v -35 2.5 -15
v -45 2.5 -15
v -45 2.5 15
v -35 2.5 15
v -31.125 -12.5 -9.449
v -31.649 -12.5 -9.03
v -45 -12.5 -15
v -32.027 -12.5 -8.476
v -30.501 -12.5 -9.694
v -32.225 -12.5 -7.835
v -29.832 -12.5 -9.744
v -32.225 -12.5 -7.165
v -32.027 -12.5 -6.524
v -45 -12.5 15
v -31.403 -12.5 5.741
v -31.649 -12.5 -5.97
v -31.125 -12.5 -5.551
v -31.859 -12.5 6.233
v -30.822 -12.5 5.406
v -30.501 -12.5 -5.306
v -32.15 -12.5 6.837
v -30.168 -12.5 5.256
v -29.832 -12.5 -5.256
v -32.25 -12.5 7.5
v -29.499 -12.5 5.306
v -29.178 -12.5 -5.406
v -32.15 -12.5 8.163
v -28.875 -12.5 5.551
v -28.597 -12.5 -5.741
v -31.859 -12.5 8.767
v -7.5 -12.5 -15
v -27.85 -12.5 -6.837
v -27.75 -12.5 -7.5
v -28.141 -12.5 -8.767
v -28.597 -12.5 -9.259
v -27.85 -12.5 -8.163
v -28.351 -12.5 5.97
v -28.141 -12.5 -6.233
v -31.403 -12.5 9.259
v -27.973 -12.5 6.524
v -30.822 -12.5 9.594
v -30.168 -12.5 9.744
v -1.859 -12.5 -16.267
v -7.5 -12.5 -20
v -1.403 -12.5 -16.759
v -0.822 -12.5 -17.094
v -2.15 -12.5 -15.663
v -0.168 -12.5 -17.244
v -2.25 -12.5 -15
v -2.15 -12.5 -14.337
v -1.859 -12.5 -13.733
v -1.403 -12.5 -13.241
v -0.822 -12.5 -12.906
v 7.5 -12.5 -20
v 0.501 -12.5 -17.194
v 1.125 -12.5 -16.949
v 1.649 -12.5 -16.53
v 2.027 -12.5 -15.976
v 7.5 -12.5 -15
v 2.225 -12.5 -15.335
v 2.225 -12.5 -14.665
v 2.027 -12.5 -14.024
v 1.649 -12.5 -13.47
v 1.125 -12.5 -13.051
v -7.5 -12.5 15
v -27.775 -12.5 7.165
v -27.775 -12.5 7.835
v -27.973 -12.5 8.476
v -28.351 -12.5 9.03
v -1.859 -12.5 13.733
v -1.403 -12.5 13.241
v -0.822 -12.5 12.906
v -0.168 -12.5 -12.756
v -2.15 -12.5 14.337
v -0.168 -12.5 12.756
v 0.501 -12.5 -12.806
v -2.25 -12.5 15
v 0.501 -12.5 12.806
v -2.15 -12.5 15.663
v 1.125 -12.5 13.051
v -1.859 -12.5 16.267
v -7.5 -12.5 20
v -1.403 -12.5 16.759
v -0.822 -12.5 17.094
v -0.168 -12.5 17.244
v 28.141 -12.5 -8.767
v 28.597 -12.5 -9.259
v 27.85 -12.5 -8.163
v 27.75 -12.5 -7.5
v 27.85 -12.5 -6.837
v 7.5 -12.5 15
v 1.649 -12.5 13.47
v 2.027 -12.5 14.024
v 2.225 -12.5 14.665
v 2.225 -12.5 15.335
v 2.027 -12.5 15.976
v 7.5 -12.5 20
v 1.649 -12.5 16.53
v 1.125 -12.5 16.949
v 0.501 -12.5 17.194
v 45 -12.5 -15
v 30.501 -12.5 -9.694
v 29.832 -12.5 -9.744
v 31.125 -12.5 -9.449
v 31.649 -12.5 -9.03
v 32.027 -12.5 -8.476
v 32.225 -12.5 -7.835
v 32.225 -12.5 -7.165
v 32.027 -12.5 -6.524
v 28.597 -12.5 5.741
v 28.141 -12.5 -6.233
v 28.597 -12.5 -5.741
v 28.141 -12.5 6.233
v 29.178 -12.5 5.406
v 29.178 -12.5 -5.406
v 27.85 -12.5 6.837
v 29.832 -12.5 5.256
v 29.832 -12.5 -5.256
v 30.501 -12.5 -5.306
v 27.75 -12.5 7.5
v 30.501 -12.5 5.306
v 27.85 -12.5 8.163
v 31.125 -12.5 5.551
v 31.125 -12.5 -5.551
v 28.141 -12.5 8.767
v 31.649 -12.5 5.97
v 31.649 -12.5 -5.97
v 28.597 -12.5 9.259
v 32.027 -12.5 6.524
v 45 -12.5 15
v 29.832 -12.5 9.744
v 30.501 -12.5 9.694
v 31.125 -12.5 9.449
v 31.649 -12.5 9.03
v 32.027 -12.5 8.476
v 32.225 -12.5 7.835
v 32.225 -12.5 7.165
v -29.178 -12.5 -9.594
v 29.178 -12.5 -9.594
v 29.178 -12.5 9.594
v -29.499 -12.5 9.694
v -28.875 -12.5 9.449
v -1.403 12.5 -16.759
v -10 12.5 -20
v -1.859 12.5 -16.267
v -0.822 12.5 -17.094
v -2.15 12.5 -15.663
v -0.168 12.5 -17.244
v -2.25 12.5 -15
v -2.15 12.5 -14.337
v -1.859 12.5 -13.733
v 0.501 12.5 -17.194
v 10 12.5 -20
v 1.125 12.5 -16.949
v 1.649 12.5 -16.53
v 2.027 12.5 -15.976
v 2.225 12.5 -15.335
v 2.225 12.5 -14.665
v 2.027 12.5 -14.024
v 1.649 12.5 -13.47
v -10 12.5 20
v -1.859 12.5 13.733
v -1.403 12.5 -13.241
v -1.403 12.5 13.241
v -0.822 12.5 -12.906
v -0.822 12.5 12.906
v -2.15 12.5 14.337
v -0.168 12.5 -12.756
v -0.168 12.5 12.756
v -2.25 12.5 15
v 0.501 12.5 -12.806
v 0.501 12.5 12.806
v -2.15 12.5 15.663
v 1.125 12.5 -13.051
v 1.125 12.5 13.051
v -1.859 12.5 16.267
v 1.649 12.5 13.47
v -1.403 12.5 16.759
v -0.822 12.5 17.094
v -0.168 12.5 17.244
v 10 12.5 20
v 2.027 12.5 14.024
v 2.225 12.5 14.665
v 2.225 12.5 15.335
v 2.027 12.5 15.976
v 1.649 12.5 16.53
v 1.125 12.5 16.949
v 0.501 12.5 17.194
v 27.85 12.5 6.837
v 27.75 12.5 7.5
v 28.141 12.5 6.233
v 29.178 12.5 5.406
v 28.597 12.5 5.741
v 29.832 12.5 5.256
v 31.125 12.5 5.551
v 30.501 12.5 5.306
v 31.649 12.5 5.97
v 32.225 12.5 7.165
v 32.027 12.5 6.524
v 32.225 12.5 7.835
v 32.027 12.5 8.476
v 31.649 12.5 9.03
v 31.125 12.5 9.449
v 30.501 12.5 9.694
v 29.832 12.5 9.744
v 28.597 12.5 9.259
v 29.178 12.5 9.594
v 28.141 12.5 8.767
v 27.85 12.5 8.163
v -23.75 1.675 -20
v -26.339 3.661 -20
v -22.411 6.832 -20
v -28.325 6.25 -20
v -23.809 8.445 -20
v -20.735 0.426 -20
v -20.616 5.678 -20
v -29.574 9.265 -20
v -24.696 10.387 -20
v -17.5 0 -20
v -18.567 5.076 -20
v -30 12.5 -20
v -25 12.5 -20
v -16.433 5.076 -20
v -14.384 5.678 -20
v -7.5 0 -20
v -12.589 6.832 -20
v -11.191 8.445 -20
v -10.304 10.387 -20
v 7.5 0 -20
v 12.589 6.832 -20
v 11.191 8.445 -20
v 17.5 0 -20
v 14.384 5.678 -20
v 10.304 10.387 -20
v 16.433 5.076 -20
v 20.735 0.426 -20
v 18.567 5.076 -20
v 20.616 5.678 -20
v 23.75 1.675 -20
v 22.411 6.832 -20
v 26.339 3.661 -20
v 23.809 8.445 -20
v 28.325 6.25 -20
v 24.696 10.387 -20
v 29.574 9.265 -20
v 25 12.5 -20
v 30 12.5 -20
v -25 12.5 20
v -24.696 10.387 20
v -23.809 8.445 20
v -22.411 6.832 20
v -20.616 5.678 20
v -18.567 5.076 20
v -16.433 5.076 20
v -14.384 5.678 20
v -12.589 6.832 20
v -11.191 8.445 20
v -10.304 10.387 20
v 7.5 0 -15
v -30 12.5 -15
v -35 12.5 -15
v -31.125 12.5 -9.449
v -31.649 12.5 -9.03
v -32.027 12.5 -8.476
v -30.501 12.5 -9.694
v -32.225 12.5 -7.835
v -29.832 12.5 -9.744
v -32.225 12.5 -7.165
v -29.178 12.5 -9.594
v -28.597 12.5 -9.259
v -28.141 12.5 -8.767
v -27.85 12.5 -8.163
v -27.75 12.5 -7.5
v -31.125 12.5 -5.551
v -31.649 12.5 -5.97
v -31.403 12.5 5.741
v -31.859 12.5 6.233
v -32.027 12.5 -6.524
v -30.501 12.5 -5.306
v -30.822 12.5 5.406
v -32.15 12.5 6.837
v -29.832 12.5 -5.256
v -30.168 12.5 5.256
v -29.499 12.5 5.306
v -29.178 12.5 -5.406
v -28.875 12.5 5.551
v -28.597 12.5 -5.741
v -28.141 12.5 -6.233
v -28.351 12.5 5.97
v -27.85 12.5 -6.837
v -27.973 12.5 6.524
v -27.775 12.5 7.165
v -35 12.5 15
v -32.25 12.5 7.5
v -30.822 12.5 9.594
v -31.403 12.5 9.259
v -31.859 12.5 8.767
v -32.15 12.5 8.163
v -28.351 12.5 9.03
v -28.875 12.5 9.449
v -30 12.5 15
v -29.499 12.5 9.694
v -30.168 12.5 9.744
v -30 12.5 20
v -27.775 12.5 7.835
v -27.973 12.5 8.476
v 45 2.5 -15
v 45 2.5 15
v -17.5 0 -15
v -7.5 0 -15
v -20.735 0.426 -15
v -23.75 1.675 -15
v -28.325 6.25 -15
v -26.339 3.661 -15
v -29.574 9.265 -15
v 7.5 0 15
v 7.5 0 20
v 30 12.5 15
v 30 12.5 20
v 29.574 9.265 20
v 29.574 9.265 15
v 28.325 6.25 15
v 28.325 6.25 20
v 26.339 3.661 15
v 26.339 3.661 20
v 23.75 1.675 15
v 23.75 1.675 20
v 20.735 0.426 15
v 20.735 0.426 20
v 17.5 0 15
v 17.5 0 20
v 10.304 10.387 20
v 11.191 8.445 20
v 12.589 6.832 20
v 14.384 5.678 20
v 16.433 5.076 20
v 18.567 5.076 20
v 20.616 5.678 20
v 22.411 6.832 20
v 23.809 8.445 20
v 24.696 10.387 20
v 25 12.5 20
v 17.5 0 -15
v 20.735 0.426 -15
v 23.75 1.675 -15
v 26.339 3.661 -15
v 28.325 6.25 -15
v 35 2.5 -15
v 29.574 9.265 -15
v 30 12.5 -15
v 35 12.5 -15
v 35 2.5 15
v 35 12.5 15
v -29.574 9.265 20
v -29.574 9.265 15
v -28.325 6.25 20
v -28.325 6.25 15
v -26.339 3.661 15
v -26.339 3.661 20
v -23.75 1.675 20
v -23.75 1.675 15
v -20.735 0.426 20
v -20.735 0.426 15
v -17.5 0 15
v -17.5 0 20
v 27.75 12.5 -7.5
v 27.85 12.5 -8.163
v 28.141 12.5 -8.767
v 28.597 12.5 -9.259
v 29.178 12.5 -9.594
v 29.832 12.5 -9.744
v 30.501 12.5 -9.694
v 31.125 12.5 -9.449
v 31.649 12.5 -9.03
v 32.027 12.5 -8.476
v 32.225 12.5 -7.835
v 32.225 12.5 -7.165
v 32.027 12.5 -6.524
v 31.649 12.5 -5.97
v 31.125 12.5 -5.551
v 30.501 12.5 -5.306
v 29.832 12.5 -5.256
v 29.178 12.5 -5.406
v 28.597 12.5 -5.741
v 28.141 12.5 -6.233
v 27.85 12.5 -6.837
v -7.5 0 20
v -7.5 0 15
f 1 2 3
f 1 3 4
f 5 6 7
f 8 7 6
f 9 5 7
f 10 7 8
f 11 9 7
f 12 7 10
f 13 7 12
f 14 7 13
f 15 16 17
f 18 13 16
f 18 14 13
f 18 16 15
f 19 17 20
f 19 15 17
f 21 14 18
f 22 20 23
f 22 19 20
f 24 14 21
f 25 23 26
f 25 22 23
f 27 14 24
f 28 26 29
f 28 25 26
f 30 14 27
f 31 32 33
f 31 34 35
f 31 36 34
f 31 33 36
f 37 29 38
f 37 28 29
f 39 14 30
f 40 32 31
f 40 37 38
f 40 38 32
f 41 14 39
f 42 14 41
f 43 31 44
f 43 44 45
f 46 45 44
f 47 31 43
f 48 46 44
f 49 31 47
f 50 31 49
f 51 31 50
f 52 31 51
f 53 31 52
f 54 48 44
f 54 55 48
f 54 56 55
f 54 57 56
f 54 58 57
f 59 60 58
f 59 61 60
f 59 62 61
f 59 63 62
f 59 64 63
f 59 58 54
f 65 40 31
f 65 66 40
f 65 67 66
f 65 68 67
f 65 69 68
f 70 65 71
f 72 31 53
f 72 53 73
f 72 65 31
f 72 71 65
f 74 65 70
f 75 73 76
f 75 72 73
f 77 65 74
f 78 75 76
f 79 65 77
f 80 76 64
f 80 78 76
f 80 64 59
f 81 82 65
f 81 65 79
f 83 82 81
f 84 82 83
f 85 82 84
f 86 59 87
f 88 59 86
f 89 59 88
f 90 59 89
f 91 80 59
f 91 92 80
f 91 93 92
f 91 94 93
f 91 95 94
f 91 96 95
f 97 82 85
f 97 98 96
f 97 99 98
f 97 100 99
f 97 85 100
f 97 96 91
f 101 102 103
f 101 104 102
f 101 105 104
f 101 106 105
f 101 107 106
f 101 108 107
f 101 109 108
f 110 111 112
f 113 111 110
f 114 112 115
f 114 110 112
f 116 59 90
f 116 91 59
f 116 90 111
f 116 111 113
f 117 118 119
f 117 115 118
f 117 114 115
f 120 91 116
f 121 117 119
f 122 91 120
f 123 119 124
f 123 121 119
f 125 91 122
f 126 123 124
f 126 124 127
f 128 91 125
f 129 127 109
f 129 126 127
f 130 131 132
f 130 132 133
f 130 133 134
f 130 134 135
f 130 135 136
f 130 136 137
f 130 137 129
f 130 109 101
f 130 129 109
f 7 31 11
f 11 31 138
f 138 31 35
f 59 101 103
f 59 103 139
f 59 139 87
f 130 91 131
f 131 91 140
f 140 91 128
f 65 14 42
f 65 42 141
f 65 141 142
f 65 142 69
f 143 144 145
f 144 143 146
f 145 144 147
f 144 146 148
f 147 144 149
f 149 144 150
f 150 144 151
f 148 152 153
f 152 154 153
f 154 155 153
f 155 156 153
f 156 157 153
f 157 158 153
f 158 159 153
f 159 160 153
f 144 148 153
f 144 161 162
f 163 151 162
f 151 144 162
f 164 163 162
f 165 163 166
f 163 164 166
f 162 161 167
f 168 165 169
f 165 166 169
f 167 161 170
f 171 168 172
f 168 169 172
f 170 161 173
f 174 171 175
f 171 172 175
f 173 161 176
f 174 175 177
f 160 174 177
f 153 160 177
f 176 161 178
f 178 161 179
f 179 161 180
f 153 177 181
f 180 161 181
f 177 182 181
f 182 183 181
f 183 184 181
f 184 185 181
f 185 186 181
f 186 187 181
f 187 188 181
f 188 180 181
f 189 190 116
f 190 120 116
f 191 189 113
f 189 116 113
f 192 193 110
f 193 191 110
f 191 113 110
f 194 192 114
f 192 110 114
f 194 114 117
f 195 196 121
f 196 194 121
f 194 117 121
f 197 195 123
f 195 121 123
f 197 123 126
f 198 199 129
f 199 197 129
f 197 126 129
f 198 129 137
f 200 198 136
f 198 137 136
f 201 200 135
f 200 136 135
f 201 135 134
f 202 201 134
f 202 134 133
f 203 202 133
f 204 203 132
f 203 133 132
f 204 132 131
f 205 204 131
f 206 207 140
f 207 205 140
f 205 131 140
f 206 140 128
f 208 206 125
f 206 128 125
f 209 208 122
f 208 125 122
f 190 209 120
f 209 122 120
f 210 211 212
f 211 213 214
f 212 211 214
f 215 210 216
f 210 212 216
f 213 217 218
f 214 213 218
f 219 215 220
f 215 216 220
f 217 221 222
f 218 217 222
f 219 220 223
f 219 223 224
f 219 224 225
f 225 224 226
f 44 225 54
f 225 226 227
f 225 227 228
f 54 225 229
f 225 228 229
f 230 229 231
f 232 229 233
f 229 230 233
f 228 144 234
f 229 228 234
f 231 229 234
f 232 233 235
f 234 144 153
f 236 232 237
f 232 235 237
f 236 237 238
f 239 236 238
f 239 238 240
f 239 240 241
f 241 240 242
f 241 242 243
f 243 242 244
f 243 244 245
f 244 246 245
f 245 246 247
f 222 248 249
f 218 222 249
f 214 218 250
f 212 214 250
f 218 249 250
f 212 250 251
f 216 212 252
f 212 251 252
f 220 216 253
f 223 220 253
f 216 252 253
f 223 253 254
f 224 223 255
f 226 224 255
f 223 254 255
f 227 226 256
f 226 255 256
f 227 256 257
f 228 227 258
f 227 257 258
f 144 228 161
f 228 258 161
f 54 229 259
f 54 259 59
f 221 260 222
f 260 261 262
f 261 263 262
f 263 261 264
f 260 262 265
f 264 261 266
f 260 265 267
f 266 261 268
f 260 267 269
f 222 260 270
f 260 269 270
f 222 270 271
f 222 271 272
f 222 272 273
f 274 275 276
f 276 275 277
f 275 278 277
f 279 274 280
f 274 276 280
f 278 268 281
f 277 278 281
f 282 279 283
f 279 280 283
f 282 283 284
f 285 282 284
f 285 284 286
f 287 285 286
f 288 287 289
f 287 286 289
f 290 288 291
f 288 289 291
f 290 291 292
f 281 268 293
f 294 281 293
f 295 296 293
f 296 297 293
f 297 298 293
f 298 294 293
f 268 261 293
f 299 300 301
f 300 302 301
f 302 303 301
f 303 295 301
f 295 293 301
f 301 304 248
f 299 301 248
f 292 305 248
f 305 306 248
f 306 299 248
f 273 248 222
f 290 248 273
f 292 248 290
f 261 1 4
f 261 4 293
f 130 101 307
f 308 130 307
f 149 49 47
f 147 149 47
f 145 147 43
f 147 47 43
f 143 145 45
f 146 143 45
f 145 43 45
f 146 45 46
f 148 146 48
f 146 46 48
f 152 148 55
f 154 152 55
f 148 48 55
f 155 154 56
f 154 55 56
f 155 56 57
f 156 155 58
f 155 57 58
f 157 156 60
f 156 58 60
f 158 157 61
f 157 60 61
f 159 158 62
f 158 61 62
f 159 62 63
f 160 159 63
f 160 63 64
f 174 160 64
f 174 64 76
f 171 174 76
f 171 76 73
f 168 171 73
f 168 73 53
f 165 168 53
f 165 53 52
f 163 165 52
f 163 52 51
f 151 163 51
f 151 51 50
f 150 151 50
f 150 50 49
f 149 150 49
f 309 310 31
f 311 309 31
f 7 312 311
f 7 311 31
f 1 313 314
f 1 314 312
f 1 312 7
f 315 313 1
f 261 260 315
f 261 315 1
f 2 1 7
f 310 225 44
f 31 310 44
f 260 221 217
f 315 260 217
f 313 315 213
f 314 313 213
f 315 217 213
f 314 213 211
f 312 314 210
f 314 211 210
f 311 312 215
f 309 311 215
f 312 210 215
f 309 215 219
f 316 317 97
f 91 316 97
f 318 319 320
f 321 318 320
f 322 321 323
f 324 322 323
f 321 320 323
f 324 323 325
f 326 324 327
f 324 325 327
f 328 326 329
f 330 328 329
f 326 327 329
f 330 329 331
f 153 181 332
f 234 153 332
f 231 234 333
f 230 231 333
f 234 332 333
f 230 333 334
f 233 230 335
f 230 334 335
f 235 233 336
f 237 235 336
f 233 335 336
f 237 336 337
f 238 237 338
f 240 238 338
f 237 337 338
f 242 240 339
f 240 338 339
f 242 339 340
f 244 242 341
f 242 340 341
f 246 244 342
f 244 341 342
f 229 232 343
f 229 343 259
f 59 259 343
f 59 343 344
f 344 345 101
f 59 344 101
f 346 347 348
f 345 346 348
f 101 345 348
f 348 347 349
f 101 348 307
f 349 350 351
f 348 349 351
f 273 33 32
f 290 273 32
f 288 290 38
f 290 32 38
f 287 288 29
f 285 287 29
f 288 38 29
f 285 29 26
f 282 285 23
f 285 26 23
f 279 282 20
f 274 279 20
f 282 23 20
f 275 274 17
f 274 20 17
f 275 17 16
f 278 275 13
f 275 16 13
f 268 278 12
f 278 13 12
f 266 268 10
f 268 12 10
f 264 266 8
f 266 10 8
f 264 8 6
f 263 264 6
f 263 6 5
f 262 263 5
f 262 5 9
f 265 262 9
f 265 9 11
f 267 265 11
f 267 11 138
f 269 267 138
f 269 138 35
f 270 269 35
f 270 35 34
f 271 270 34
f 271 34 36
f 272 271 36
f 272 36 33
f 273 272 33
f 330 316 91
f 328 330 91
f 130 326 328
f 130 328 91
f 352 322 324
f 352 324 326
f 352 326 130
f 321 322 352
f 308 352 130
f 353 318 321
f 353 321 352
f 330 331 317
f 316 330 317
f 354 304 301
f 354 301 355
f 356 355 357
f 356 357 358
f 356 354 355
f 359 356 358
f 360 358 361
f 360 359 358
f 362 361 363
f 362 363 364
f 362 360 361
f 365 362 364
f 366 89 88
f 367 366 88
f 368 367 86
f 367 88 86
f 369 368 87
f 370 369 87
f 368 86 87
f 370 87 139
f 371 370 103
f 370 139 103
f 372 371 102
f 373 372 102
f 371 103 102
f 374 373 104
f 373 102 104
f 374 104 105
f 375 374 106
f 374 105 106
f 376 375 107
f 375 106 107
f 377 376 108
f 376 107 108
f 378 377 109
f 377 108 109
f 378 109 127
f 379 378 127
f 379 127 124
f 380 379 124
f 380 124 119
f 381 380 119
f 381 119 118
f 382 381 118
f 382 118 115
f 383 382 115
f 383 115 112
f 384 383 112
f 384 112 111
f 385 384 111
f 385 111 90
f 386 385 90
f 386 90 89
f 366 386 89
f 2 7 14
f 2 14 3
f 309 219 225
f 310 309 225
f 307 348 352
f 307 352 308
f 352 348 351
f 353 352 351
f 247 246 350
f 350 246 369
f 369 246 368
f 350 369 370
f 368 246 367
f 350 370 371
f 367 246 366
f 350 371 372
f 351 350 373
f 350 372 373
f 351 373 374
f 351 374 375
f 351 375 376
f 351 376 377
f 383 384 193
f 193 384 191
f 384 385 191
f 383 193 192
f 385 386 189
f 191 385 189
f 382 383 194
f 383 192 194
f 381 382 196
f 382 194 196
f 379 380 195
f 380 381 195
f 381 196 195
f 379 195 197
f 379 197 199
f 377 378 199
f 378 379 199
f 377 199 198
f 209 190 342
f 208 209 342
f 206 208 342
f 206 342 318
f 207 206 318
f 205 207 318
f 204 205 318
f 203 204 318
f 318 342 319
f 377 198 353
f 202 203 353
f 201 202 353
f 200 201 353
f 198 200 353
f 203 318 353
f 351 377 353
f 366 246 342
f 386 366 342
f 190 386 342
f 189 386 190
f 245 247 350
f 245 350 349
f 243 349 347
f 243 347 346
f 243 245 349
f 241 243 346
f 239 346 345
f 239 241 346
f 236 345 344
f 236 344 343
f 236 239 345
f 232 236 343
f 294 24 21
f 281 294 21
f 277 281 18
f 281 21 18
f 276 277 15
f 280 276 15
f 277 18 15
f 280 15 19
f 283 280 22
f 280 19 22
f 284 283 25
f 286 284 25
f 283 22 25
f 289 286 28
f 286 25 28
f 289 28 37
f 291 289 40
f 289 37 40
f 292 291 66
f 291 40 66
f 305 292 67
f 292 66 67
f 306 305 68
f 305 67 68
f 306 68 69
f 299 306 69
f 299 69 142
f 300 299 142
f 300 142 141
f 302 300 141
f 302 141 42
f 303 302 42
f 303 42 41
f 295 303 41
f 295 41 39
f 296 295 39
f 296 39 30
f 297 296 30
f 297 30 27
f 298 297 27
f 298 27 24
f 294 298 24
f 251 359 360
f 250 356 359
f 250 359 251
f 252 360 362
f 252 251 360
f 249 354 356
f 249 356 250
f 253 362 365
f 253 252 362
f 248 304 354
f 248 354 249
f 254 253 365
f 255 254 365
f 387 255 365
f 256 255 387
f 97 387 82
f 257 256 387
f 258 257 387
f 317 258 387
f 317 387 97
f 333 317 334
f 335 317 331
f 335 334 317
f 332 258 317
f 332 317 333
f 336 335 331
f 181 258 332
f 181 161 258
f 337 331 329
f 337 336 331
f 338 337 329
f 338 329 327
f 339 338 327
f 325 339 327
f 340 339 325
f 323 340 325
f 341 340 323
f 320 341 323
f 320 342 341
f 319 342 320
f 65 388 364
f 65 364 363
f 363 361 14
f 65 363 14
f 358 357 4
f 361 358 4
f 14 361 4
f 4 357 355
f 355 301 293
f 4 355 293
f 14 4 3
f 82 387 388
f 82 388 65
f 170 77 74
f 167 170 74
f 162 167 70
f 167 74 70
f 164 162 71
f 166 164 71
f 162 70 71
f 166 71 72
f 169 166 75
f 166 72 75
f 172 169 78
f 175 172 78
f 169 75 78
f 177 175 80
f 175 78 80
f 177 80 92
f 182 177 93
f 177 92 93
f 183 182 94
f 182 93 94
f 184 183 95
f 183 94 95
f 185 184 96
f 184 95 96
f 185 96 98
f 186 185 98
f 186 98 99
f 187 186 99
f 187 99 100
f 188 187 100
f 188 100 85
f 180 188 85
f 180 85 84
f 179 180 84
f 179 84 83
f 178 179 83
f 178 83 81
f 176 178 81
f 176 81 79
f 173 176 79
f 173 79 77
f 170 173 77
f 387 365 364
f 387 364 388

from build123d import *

# Parameters (mm, degrees)
SKETCH1_W               = 90
SKETCH1_H               = 25
BOSS_EXTRUDE1_DEPTH     = 20
CUT_EXTRUDE1_DEPTH      = 62.491869381
CUT_EXTRUDE1_DEPTH_BACK = 62.491869381
SKETCH2_W               = 10
SKETCH2_H               = 10
CUT_EXTRUDE2_DEPTH      = 5
CUT_EXTRUDE3_DEPTH      = 62.491869381
HOLE1_D                 = 4.5
LPATTERN1_COUNT         = 2
LPATTERN1_PITCH         = 15
LPATTERN1_COL_COUNT     = 2
LPATTERN1_COL_PITCH     = 60
MIRROR2_COPY_1_D        = 4.5
MIRROR2_COPY_2_D        = 4.5
MIRROR2_COPY_3_D        = 4.5
HOLE2_D                 = 4.5


with BuildPart() as part:
    # Sketch1 → Boss-Extrude1 (new, symmetric)
    with BuildSketch(Plane.XY):
        Rectangle(SKETCH1_W, SKETCH1_H)
    extrude(amount=BOSS_EXTRUDE1_DEPTH, both=True)

    # Sketch2 → Cut-Extrude1 (cut, two sides: drawn at the far end of the back side and taken through both)
    with BuildSketch(Plane.XY.offset(20).offset(-CUT_EXTRUDE1_DEPTH_BACK)):
        with Locations((-40, 7.5)):
            Rectangle(SKETCH2_W, SKETCH2_H)
        with Locations((40, 7.5)):
            Rectangle(SKETCH2_W, SKETCH2_H)
    extrude(amount=CUT_EXTRUDE1_DEPTH + CUT_EXTRUDE1_DEPTH_BACK, mode=Mode.SUBTRACT)

    # Sketch3 → Cut-Extrude2 (cut)
    with BuildSketch(Plane.XY.offset(20)):
        with BuildLine():
            Line((45, -12.5), (45, 2.5))
            Line((45, 2.5), (35, 2.5))
            Line((35, 2.5), (35, 12.5))
            Line((35, 12.5), (30, 12.5))
            ThreePointArc((30, 12.5), (26.338834765, 3.661165235), (17.5, 0))
            Line((17.5, 0), (7.5, 0))
            Line((7.5, 0), (7.5, -12.5))
            Line((7.5, -12.5), (45, -12.5))
        make_face()
        with BuildLine():
            Line((-7.5, -12.5), (-45, -12.5))
            Line((-45, -12.5), (-45, 2.5))
            Line((-45, 2.5), (-35, 2.5))
            Line((-35, 2.5), (-35, 12.5))
            Line((-35, 12.5), (-30, 12.5))
            ThreePointArc((-30, 12.5), (-26.338834765, 3.661165235), (-17.5, 0))
            Line((-17.5, 0), (-7.5, 0))
            Line((-7.5, 0), (-7.5, -12.5))
        make_face()
    cut_extrude2 = extrude(amount=-CUT_EXTRUDE2_DEPTH, mode=Mode.SUBTRACT)

    # Mirror1: Cut-Extrude2 across plane
    add(cut_extrude2.mirror(Plane.XY), mode=Mode.SUBTRACT)

    # Sketch4 → Cut-Extrude3 (cut, through all)
    with BuildSketch(Plane.XY.offset(20)):
        with BuildLine():
            Line((25, 12.5), (10, 12.5))
            ThreePointArc((10, 12.5), (17.5, 5), (25, 12.5))
        make_face()
        with BuildLine():
            Line((-10, 12.5), (-25, 12.5))
            ThreePointArc((-25, 12.5), (-17.5, 5), (-10, 12.5))
        make_face()
    extrude(amount=-CUT_EXTRUDE3_DEPTH, mode=Mode.SUBTRACT)

    # Hole1 (through all)
    with Locations(Plane(origin=(0, 12.5, 0), x_dir=(1, 0, 0), z_dir=(0, 1, 0))):
        with Locations((30, -7.5)):
            hole1 = Hole(HOLE1_D / 2)

    # LPattern1: Hole1 ×2
    with Locations(*[(0, 0, -i * LPATTERN1_PITCH) for i in range(1, LPATTERN1_COUNT)]):
        add(hole1, mode=Mode.SUBTRACT)

    # LPattern1 col: Hole1 ×2
    with Locations(*[(-i * LPATTERN1_COL_PITCH, 0, 0) for i in range(1, LPATTERN1_COL_COUNT)]):
        add(hole1, mode=Mode.SUBTRACT)

    # Mirror2 copy 1 (through all)
    with Locations(Plane(origin=(0, 12.5, -15), x_dir=(-1, 0, 0), z_dir=(0, 1, 0))):
        with Locations((30, 7.5)):
            Hole(MIRROR2_COPY_1_D / 2)

    # Mirror2 copy 2 (through all)
    with Locations(Plane(origin=(60, 12.5, 0), x_dir=(-1, 0, 0), z_dir=(0, 1, 0))):
        with Locations((30, 7.5)):
            Hole(MIRROR2_COPY_2_D / 2)

    # Mirror2 copy 3 (through all)
    with Locations(Plane(origin=(0, 12.5, 0), x_dir=(-1, 0, 0), z_dir=(0, 1, 0))):
        with Locations((30, 7.5)):
            Hole(MIRROR2_COPY_3_D / 2)

    # Hole2 (through all)
    with Locations(Plane(origin=(0, 12.5, 0), x_dir=(1, 0, 0), z_dir=(0, 1, 0))):
        with Locations((0, -15), (0, 15)):
            Hole(HOLE2_D / 2)


solid = part.part
